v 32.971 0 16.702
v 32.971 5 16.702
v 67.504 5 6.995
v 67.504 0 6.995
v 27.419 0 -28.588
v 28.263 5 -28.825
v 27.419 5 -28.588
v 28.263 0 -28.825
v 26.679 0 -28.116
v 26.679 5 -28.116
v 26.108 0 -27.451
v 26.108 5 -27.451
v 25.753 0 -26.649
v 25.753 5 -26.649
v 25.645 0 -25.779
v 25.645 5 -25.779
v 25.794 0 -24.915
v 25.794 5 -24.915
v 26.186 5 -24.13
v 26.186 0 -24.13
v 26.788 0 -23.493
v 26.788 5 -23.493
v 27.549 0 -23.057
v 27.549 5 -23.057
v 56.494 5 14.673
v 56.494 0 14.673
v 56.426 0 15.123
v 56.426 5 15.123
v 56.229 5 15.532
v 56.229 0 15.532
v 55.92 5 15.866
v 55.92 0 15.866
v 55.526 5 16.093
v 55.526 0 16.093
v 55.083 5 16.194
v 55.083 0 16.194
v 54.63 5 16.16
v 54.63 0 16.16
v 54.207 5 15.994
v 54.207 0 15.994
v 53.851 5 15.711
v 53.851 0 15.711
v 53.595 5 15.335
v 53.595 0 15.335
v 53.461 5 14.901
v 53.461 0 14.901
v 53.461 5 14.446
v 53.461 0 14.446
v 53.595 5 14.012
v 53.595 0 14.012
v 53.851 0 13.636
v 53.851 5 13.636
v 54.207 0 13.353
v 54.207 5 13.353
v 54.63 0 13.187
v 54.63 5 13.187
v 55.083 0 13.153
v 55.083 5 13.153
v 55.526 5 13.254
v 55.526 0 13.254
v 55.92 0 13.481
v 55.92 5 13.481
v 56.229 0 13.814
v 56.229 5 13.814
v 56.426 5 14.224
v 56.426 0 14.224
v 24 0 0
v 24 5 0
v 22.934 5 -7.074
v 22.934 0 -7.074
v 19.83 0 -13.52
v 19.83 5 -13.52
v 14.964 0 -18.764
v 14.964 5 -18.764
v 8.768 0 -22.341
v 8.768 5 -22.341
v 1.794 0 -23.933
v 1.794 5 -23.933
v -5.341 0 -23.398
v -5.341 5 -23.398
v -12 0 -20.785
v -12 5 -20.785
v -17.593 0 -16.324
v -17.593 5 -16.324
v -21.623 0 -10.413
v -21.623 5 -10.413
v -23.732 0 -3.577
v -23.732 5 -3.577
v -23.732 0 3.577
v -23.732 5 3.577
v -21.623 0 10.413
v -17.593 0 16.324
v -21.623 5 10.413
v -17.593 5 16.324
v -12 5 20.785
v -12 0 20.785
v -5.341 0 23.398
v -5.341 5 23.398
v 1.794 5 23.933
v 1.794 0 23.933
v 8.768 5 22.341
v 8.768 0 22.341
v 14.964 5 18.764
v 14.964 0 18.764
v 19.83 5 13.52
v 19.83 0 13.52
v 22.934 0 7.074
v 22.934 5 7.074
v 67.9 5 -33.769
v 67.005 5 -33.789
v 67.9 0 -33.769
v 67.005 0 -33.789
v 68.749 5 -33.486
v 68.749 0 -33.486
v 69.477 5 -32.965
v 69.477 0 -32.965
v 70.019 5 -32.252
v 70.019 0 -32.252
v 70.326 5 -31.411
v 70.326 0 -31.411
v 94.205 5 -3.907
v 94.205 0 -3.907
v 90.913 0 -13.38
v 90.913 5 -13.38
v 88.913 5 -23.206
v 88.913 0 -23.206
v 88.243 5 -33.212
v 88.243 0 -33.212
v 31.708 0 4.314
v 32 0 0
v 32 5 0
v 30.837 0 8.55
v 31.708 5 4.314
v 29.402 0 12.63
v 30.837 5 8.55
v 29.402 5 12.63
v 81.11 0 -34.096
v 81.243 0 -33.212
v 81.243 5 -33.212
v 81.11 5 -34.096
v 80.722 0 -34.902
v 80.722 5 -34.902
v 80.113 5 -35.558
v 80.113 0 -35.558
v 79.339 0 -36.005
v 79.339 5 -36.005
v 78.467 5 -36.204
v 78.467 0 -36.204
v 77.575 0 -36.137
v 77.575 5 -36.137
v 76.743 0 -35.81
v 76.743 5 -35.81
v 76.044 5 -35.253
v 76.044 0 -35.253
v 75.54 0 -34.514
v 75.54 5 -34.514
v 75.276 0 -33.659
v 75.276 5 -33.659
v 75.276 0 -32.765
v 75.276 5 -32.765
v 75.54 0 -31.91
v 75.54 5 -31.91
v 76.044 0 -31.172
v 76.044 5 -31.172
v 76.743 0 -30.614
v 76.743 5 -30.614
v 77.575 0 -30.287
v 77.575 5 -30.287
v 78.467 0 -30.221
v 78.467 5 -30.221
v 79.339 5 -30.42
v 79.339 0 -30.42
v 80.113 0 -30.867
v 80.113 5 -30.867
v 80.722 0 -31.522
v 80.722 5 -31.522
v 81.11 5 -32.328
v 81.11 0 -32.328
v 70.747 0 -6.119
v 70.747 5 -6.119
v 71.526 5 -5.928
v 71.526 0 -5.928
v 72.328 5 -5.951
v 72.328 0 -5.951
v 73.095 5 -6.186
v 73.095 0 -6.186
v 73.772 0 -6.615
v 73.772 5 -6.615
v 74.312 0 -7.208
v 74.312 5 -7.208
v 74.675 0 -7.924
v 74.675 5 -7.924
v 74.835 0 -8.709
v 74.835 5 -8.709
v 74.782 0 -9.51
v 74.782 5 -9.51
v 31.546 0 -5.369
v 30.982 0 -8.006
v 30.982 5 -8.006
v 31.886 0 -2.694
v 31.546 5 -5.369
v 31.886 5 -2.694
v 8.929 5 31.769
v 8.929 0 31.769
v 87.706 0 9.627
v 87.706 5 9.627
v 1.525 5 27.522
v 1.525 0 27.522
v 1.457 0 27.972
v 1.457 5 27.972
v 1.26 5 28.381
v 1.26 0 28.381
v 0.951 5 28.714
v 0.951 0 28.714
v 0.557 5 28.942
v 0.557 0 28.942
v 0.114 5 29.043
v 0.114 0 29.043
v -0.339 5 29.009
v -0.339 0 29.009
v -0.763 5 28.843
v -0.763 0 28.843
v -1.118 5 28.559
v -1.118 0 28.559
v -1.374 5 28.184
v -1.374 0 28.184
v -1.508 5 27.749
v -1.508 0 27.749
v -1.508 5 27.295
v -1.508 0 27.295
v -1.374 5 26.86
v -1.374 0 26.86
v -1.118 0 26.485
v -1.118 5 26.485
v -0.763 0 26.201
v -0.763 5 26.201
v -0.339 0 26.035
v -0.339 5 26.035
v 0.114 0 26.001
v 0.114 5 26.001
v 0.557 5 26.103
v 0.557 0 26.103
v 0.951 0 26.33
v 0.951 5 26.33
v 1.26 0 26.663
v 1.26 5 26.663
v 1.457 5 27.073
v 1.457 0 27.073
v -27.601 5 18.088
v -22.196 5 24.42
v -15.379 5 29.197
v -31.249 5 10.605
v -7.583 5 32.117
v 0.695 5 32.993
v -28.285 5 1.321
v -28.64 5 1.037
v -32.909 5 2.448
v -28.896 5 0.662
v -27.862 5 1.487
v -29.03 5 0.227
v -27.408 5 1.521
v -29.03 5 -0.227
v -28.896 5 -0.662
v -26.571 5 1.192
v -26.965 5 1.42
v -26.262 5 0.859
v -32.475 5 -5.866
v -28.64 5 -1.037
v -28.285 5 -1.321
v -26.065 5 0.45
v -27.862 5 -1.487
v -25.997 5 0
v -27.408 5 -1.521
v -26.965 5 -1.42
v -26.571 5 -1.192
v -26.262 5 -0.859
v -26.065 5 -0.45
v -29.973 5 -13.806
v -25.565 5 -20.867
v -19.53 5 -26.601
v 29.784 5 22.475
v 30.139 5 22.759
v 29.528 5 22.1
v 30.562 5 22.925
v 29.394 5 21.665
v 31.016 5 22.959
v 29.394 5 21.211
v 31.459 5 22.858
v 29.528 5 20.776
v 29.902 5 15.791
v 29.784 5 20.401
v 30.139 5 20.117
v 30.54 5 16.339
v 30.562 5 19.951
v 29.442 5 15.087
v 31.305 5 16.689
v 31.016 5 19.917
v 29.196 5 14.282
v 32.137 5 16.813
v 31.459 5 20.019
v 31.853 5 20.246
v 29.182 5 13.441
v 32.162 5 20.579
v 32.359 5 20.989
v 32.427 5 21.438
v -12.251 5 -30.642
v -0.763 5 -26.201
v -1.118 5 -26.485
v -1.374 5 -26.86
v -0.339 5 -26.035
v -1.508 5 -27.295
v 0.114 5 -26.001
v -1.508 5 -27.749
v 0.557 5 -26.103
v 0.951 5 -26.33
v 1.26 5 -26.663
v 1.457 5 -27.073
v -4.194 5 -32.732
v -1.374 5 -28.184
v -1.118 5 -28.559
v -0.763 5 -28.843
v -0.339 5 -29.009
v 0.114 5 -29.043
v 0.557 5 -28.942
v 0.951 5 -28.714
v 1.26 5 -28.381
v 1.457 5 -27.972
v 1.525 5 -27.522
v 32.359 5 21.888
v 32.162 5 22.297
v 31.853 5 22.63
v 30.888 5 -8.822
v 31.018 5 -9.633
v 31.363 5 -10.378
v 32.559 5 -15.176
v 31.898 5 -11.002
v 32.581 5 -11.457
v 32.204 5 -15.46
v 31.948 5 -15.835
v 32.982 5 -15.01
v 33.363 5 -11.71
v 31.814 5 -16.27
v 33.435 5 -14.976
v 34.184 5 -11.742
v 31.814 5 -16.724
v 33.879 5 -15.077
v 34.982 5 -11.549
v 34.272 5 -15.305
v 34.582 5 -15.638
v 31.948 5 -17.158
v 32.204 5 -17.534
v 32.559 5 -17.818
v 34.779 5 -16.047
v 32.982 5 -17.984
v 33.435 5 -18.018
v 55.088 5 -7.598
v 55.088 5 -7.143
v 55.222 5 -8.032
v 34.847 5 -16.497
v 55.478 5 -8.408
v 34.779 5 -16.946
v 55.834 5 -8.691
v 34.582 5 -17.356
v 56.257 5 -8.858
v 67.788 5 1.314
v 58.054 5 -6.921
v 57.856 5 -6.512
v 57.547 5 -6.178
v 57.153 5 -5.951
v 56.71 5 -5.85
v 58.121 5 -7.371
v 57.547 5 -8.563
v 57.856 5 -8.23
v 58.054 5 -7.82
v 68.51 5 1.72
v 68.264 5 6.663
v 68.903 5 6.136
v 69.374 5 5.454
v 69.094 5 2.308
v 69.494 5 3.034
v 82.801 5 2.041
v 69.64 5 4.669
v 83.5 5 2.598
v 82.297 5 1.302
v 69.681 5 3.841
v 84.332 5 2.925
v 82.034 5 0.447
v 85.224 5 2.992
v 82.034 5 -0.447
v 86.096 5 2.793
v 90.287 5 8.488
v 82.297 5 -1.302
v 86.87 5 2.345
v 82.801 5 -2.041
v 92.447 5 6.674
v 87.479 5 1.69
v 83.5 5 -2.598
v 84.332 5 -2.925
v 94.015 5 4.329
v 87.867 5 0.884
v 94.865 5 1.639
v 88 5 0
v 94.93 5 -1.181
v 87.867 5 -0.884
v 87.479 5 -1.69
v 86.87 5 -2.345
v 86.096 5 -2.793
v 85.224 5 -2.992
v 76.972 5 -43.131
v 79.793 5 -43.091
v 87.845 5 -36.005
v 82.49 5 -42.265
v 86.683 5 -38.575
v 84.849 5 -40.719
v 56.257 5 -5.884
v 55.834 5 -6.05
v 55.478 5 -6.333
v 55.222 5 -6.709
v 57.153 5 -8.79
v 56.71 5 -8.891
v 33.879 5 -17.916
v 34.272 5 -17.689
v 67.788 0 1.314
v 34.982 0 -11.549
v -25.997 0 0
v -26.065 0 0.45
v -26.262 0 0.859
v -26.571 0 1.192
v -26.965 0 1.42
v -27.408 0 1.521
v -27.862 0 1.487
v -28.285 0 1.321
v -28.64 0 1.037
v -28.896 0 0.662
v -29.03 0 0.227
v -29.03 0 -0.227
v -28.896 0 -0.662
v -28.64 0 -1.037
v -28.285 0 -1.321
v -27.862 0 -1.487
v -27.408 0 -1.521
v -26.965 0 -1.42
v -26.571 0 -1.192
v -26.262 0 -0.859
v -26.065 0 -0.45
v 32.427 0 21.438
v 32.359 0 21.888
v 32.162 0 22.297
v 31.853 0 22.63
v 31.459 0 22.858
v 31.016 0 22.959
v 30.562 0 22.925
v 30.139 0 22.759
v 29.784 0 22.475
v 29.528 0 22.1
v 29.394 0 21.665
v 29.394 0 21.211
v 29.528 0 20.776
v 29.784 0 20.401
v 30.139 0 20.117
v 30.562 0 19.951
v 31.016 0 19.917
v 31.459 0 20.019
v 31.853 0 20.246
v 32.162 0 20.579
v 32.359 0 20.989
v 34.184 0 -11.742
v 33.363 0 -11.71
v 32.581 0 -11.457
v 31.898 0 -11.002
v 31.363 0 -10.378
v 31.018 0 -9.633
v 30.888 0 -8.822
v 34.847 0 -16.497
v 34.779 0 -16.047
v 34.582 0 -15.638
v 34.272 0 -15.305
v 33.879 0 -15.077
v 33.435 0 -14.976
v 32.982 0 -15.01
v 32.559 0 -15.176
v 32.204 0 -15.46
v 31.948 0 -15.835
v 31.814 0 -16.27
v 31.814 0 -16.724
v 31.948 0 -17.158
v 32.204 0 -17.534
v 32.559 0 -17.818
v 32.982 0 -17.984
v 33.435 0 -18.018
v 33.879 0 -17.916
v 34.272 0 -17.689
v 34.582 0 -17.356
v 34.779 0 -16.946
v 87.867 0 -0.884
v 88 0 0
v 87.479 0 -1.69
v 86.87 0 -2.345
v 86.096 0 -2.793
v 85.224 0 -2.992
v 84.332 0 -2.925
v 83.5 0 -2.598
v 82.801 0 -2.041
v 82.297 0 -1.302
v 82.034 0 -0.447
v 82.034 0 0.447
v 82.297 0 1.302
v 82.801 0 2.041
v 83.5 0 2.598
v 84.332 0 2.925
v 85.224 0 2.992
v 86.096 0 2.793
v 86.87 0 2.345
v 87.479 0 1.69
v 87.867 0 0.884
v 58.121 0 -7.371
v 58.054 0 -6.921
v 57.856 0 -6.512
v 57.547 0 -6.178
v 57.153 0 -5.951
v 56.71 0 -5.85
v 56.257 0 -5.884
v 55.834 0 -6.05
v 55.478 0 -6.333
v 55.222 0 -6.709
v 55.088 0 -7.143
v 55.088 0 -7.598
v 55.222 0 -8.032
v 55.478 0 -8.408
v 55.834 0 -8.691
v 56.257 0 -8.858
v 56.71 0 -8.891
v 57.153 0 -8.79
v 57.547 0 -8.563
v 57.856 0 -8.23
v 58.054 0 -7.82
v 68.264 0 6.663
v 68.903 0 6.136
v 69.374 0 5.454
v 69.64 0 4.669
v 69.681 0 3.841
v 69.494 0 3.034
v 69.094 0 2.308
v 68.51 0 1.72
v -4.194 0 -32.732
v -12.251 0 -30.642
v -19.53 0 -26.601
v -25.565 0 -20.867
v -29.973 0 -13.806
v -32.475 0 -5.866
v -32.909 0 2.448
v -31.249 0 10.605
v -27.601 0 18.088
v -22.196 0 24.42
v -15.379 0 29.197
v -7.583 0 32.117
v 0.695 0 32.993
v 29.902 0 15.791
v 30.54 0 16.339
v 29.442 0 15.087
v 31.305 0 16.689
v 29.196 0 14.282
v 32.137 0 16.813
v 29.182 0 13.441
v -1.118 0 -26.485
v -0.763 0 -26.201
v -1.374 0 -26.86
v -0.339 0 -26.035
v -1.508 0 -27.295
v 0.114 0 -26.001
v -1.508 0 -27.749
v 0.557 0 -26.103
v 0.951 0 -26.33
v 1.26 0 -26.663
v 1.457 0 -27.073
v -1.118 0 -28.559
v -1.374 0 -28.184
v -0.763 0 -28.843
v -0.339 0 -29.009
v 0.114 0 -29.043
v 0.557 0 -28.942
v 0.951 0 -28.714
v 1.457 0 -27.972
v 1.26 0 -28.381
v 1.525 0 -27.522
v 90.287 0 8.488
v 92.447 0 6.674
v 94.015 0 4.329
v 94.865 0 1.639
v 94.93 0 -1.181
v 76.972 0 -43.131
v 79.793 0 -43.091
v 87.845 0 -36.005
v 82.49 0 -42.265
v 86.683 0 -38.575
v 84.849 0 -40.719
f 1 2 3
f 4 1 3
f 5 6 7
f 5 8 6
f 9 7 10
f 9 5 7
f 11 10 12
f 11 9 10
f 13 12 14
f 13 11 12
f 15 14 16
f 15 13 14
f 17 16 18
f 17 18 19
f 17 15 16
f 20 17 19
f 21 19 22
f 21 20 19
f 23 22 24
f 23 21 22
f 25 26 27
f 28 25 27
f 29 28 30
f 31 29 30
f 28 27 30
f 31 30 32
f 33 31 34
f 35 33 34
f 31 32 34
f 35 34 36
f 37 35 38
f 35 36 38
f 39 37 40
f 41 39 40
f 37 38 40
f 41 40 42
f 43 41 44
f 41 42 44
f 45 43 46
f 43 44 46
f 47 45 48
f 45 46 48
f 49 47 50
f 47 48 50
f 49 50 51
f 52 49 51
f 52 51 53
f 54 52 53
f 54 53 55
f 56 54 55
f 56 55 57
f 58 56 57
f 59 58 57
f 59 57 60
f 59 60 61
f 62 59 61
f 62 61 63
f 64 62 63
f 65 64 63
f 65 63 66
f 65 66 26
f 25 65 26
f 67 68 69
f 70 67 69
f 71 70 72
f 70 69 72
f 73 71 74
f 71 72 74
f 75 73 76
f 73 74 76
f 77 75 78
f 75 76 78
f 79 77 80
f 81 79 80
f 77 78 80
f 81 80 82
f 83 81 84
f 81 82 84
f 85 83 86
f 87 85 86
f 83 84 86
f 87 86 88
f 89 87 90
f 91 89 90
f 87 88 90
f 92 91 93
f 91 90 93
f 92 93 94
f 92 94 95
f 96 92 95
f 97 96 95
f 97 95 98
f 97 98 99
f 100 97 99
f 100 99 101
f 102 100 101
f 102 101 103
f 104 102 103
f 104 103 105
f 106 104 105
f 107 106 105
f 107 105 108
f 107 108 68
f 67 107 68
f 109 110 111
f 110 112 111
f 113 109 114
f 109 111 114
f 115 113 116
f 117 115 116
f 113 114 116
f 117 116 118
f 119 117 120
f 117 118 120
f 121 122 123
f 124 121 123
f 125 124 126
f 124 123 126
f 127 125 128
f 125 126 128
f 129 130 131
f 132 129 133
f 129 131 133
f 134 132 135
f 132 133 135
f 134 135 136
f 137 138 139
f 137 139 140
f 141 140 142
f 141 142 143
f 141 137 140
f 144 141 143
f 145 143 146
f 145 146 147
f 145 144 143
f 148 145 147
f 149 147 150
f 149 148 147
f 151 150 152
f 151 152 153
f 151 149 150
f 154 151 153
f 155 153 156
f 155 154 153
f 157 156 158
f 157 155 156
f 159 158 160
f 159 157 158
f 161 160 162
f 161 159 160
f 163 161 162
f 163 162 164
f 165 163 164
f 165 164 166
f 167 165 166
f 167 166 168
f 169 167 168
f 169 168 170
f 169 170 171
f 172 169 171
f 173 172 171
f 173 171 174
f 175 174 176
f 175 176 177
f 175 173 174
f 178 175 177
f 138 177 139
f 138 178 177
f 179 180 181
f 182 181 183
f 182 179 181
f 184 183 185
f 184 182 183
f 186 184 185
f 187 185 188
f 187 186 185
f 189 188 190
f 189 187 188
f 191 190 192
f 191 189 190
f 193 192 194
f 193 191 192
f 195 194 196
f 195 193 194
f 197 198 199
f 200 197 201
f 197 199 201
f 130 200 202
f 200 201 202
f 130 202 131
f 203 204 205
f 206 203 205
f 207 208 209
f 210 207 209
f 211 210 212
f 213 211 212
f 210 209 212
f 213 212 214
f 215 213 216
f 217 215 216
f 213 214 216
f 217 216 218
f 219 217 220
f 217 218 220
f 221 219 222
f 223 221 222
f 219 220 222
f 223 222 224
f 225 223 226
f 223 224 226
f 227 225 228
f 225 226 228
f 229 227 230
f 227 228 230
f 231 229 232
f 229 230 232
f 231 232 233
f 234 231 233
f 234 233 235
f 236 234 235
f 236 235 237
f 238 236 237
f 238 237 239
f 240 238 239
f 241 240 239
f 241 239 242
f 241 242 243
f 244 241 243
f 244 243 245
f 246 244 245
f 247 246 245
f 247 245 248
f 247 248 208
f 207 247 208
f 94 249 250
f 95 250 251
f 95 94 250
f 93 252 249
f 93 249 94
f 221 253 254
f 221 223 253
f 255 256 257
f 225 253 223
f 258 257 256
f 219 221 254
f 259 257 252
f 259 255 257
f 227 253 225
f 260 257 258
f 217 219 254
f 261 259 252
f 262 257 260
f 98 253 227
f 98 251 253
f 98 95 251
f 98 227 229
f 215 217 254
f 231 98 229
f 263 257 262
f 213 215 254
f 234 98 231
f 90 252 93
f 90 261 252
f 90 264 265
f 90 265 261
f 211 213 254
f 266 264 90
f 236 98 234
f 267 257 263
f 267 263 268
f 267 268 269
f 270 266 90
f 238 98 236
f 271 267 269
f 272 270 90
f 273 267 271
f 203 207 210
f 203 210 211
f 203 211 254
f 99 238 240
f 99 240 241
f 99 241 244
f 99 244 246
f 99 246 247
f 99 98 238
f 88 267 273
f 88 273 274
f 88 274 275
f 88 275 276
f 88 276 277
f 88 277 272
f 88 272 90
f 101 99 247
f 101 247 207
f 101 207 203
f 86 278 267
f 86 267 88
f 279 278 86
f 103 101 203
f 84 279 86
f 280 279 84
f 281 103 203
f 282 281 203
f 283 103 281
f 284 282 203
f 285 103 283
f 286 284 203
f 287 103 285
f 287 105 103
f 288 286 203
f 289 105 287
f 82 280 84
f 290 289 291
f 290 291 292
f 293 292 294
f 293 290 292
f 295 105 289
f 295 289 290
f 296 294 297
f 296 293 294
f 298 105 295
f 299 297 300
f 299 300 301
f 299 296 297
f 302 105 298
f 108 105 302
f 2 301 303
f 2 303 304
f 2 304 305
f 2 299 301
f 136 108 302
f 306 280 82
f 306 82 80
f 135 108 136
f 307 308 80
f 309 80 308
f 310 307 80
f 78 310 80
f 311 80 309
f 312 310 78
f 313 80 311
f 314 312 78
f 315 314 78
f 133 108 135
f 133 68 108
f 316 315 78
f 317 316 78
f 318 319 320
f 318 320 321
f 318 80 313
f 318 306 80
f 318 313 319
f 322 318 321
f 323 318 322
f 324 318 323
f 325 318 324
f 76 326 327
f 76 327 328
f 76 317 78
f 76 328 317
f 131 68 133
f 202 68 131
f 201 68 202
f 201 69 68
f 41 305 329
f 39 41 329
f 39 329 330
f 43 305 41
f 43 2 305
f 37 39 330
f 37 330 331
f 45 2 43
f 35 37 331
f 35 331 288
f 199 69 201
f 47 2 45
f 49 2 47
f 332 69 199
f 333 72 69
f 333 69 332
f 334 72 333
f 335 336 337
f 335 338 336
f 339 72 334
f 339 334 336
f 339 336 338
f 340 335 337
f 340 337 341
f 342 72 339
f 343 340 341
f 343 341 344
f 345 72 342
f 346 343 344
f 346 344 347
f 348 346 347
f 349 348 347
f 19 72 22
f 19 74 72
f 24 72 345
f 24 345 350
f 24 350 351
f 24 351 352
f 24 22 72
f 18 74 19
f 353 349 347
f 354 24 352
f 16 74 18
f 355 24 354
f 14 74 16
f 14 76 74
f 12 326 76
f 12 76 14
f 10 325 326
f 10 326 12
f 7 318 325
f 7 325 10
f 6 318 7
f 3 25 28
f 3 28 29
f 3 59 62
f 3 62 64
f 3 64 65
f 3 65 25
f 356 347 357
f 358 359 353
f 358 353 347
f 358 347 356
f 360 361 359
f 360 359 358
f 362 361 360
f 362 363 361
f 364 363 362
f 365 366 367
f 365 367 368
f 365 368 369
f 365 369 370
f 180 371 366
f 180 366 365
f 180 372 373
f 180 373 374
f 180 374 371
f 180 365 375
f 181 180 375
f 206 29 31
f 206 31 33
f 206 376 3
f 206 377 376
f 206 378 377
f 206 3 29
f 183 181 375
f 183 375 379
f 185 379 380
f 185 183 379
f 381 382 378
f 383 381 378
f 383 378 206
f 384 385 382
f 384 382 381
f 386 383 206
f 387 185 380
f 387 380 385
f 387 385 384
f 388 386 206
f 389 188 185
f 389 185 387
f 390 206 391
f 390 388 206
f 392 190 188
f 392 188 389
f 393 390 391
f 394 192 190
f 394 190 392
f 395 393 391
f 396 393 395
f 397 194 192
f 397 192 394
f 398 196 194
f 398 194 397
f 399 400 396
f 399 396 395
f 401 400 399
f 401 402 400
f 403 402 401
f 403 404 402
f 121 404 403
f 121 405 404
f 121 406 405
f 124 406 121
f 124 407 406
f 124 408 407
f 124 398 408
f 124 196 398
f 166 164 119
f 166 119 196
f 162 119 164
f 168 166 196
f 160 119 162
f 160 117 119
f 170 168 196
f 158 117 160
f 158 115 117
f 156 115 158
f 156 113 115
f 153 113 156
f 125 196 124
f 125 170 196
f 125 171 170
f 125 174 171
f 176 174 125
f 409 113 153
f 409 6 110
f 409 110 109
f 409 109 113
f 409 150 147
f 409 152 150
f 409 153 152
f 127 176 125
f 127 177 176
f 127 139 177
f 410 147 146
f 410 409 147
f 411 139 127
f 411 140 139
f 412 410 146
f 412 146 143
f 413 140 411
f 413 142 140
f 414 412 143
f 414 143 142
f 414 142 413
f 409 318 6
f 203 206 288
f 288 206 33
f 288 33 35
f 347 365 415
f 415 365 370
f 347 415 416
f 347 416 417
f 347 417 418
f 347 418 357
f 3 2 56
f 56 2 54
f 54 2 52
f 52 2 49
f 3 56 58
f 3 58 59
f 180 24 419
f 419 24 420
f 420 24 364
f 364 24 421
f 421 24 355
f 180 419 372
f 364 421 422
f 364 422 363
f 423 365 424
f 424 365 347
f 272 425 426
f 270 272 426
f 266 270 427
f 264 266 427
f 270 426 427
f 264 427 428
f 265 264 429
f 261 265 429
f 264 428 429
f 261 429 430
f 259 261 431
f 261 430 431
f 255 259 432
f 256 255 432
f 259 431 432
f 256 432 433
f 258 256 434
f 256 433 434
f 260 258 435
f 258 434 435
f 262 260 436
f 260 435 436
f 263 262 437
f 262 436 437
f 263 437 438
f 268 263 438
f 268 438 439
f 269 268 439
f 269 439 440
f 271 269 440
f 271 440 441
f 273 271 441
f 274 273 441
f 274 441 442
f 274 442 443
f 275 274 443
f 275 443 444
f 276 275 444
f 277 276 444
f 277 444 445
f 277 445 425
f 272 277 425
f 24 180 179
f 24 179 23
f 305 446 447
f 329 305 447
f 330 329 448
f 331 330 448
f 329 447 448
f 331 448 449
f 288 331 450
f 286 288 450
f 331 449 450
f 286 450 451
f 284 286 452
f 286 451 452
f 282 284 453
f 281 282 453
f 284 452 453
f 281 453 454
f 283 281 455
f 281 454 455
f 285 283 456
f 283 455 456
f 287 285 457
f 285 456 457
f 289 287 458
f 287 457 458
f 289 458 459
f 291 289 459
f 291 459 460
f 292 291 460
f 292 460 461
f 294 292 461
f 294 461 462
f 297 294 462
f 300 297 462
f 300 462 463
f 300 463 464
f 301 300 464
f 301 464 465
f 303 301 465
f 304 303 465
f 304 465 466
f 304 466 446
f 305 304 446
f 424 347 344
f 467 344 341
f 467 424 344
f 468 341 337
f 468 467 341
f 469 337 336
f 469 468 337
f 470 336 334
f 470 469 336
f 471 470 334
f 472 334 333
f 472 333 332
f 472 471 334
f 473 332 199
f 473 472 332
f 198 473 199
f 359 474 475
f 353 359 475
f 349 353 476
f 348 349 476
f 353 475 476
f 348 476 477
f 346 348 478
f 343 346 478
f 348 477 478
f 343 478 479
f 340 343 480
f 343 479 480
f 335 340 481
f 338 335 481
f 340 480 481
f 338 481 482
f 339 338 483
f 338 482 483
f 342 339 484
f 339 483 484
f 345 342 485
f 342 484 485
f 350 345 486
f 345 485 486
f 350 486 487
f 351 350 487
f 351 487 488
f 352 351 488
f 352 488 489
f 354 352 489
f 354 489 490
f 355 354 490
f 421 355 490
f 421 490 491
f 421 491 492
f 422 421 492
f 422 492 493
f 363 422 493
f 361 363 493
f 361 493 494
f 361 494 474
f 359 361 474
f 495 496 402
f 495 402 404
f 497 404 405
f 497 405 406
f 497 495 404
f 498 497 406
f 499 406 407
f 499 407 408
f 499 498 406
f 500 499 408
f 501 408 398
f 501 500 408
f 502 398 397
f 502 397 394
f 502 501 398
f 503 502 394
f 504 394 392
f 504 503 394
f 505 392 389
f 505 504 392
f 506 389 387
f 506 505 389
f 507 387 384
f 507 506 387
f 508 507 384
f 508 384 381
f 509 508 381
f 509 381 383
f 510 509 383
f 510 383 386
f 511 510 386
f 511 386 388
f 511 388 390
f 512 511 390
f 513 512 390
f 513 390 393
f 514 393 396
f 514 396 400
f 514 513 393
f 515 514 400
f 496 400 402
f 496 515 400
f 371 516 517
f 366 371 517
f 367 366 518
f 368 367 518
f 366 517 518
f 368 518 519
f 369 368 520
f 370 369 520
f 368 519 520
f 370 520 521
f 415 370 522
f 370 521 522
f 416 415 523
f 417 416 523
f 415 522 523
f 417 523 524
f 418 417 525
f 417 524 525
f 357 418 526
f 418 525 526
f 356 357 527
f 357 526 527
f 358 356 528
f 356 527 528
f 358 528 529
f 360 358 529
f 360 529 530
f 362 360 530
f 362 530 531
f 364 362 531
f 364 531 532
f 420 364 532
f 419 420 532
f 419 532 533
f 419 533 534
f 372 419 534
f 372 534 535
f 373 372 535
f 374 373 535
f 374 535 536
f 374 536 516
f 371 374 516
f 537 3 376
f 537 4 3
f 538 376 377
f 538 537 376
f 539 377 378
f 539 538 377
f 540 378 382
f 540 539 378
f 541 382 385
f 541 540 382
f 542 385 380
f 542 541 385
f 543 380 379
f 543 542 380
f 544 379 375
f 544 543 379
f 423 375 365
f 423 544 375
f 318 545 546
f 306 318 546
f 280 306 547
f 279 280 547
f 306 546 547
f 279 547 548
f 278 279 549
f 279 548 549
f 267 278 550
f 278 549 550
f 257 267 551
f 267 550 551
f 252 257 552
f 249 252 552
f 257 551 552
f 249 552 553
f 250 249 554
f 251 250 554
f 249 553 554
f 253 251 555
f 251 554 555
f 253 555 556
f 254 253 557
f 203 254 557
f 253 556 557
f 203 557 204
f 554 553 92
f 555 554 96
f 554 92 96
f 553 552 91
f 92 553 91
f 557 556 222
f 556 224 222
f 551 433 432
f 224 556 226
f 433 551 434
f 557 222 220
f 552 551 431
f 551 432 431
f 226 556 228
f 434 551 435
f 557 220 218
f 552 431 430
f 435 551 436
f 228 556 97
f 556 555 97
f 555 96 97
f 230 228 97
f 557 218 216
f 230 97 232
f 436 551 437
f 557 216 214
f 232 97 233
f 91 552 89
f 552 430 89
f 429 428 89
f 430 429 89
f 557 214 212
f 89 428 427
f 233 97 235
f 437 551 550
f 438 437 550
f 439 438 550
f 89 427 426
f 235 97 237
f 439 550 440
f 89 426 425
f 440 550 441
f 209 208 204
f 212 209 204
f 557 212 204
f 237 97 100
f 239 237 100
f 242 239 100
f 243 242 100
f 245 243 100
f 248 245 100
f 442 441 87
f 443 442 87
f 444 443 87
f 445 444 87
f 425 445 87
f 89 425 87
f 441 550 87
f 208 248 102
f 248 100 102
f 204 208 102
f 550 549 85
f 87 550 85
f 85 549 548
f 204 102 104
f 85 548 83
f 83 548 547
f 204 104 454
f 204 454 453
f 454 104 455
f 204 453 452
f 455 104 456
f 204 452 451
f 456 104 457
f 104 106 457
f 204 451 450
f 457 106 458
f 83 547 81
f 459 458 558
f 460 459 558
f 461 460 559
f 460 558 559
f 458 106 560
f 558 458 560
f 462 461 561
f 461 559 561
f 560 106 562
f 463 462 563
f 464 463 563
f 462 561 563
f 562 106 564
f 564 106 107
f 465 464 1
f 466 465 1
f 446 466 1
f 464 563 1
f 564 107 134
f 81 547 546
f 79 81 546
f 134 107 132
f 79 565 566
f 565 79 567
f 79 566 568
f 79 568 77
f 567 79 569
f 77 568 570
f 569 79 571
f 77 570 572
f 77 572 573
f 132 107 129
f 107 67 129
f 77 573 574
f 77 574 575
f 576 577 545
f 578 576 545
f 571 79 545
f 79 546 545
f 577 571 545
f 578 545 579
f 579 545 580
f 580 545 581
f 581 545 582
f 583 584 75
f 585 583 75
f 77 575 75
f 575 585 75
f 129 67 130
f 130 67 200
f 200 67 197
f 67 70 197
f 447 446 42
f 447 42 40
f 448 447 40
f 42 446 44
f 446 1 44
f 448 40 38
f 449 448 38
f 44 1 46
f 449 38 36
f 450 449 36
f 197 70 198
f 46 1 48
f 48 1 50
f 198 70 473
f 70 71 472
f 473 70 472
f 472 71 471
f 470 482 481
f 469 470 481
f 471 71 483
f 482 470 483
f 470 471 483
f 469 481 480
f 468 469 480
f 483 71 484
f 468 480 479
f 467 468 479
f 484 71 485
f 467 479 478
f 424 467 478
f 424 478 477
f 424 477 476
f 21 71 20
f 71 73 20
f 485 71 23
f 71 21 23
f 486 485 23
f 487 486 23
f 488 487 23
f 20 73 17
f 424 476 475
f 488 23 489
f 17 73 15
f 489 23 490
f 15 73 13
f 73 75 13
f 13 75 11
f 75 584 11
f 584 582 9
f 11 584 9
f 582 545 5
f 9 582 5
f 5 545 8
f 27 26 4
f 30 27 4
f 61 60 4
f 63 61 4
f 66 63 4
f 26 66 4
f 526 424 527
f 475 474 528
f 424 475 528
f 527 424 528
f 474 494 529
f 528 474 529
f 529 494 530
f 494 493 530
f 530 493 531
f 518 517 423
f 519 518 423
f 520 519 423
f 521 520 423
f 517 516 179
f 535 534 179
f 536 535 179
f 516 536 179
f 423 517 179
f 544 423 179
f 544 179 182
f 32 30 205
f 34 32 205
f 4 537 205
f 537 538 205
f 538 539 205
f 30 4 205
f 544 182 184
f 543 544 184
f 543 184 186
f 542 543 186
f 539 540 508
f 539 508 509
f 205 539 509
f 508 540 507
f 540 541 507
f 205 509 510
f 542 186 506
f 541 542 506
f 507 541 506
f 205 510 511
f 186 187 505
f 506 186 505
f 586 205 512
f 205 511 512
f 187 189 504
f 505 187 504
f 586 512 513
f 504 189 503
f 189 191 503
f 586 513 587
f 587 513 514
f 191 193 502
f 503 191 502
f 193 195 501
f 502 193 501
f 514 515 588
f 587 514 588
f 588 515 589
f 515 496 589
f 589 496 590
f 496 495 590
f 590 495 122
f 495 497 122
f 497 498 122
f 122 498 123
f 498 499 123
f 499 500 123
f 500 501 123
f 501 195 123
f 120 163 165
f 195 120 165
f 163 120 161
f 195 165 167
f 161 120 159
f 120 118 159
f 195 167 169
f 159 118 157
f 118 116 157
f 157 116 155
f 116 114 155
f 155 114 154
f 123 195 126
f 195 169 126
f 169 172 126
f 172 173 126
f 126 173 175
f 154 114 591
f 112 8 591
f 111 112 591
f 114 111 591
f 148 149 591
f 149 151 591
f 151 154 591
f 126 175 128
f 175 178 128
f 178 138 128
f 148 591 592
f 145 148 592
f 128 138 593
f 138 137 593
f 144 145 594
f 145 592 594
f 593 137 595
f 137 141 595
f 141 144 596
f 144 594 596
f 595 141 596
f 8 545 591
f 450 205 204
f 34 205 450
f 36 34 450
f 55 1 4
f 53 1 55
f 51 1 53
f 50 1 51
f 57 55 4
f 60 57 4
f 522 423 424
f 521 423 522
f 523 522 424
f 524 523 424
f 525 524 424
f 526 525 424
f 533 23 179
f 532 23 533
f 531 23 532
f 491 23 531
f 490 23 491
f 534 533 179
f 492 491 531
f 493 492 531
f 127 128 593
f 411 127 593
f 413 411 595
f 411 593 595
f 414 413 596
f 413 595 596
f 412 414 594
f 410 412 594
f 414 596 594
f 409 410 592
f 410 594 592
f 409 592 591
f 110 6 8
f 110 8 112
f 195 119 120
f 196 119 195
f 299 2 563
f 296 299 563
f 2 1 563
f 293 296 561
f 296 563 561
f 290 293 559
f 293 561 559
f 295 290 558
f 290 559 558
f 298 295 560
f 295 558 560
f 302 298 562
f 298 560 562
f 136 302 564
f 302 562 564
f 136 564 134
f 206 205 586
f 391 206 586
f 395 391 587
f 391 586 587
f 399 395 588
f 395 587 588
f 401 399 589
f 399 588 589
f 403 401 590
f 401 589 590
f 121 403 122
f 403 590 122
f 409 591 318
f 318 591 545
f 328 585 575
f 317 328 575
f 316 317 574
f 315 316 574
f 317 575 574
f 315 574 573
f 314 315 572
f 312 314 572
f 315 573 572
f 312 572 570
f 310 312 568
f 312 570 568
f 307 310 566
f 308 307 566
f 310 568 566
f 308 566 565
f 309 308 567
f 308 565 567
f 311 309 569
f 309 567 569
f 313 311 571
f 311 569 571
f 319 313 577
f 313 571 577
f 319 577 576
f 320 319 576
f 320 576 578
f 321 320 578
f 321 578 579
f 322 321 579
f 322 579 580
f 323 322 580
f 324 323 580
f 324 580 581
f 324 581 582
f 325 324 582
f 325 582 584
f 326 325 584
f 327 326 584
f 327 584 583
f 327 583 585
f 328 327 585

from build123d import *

# Parameters (mm, degrees)
SKETCH_1_R          = 2.025
SKETCH_1_R_2        = 13.1
SKETCH_1_R_3        = 3
EXTRUDE_1_DEPTH     = 5
SKETCH_3_R          = 24
CUT_EXTRUDE_2_DEPTH = 10
CUT_EXTRUDE_3_DEPTH = 10
FILLET_1_R          = 3
SKETCH_7_R          = 1.525
CUT_EXTRUDE_4_DEPTH = 10


with BuildPart() as part:
    # 草图1 → 凸台-拉伸1 (new body)
    with BuildSketch(Plane(origin=(0, 0, 0), x_dir=(1, 0, 0), z_dir=(0, 1, 0))):
        with BuildLine():
            Line((76.972140647, 43.13107423), (-4.193547259, 32.732463418))
            ThreePointArc((-4.193547259, 32.732463418), (-32.337515252, -6.579141836), (8.929411765, -31.768940894))
            Line((8.929411765, -31.768940894), (87.705882353, -9.626951786))
            ThreePointArc((87.705882353, -9.626951786), (94.014523475, -4.328783491), (94.205048973, 3.907310252))
            ThreePointArc((94.205048973, 3.907310252), (89.748559809, 18.25955029), (88.242912543, 33.212145922))
            ThreePointArc((88.242912543, 33.212145922), (84.849435117, 40.719066694), (76.972140647, 43.13107423))
        make_face()
        with Locations((0, 17.5)):
            Circle(SKETCH_1_R, mode=Mode.SUBTRACT)
        with Locations((8.75, 15.155444566)):
            Circle(SKETCH_1_R, mode=Mode.SUBTRACT)
        with Locations((-8.75, -15.155444566)):
            Circle(SKETCH_1_R, mode=Mode.SUBTRACT)
        with Locations((0, -17.5)):
            Circle(SKETCH_1_R, mode=Mode.SUBTRACT)
        with Locations((-15.155444566, -8.75)):
            Circle(SKETCH_1_R, mode=Mode.SUBTRACT)
        with Locations((8.75, -15.155444566)):
            Circle(SKETCH_1_R, mode=Mode.SUBTRACT)
        with Locations((15.155444566, -8.75)):
            Circle(SKETCH_1_R, mode=Mode.SUBTRACT)
        with Locations((-17.5, 0)):
            Circle(SKETCH_1_R, mode=Mode.SUBTRACT)
        Circle(SKETCH_1_R_2, mode=Mode.SUBTRACT)
        with Locations((-15.155444566, 8.75)):
            Circle(SKETCH_1_R, mode=Mode.SUBTRACT)
        with Locations((17.5, 0)):
            Circle(SKETCH_1_R, mode=Mode.SUBTRACT)
        with Locations((15.155444566, 8.75)):
            Circle(SKETCH_1_R, mode=Mode.SUBTRACT)
        with Locations((-8.75, 15.155444566)):
            Circle(SKETCH_1_R, mode=Mode.SUBTRACT)
        with Locations((85, 0)):
            Circle(SKETCH_1_R_3, mode=Mode.SUBTRACT)
        with Locations((78.242912543, 33.212145922)):
            Circle(SKETCH_1_R_3, mode=Mode.SUBTRACT)
    extrude(amount=EXTRUDE_1_DEPTH)

    # 草图3 → 切除-拉伸2 (cut)
    with BuildSketch(Plane(origin=(0, 5, 0), x_dir=(1, 0, 0), z_dir=(0, 1, 0))):
        Circle(SKETCH_3_R)
    extrude(amount=-CUT_EXTRUDE_2_DEPTH, mode=Mode.SUBTRACT)

    # 草图4 → 切除-拉伸3 (cut)
    with BuildSketch(Plane(origin=(0, 5, 0), x_dir=(1, 0, 0), z_dir=(0, 1, 0))):
        Polygon((69.770383541, 34.143027562), (75.881597407, 4.105451761), (16.636114037, 27.335685646), align=None)
        with BuildLine():
            ThreePointArc((32, 0), (30.461655113, -9.802426627), (25.994527014, -18.662383699))
            Line((25.994527014, -18.662383699), (76.108728609, -4.576602785))
            Line((76.108728609, -4.576602785), (28.785186198, 13.979021981))
            ThreePointArc((28.785186198, 13.979021981), (31.185942012, 7.171960739), (32, 0))
        make_face()
    extrude(amount=-CUT_EXTRUDE_3_DEPTH, mode=Mode.SUBTRACT)

    # 圆角1
    fillet_1_edges = [part.edges().sort_by_distance(p)[0] for p in [
        (25.994527014, 2.5, 18.662383699),
        (28.785186198, 2.5, -13.979021981),
        (76.108728609, 2.5, 4.576602785),
        (69.770383541, 2.5, -34.143027562),
        (75.881597407, 2.5, -4.105451761),
        (16.636114037, 2.5, -27.335685646),
    ]]
    fillet(fillet_1_edges, radius=FILLET_1_R)

    # 草图7 → 切除-拉伸4 (cut)
    with BuildSketch(Plane.XZ):
        with Locations((0, -27.522163408)):
            Circle(SKETCH_7_R)
        with Locations((33.321534862, -16.496811603)):
            Circle(SKETCH_7_R)
        with Locations((-27.522163408, 0)):
            Circle(SKETCH_7_R)
        with Locations((0, 27.522163408)):
            Circle(SKETCH_7_R)
        with Locations((30.901702525, 21.438107622)):
            Circle(SKETCH_7_R)
        with Locations((56.596303964, -7.370743267)):
            Circle(SKETCH_7_R)
        with Locations((54.969081991, 14.673401739)):
            Circle(SKETCH_7_R)
    extrude(amount=-CUT_EXTRUDE_4_DEPTH, mode=Mode.SUBTRACT)


solid = part.part
